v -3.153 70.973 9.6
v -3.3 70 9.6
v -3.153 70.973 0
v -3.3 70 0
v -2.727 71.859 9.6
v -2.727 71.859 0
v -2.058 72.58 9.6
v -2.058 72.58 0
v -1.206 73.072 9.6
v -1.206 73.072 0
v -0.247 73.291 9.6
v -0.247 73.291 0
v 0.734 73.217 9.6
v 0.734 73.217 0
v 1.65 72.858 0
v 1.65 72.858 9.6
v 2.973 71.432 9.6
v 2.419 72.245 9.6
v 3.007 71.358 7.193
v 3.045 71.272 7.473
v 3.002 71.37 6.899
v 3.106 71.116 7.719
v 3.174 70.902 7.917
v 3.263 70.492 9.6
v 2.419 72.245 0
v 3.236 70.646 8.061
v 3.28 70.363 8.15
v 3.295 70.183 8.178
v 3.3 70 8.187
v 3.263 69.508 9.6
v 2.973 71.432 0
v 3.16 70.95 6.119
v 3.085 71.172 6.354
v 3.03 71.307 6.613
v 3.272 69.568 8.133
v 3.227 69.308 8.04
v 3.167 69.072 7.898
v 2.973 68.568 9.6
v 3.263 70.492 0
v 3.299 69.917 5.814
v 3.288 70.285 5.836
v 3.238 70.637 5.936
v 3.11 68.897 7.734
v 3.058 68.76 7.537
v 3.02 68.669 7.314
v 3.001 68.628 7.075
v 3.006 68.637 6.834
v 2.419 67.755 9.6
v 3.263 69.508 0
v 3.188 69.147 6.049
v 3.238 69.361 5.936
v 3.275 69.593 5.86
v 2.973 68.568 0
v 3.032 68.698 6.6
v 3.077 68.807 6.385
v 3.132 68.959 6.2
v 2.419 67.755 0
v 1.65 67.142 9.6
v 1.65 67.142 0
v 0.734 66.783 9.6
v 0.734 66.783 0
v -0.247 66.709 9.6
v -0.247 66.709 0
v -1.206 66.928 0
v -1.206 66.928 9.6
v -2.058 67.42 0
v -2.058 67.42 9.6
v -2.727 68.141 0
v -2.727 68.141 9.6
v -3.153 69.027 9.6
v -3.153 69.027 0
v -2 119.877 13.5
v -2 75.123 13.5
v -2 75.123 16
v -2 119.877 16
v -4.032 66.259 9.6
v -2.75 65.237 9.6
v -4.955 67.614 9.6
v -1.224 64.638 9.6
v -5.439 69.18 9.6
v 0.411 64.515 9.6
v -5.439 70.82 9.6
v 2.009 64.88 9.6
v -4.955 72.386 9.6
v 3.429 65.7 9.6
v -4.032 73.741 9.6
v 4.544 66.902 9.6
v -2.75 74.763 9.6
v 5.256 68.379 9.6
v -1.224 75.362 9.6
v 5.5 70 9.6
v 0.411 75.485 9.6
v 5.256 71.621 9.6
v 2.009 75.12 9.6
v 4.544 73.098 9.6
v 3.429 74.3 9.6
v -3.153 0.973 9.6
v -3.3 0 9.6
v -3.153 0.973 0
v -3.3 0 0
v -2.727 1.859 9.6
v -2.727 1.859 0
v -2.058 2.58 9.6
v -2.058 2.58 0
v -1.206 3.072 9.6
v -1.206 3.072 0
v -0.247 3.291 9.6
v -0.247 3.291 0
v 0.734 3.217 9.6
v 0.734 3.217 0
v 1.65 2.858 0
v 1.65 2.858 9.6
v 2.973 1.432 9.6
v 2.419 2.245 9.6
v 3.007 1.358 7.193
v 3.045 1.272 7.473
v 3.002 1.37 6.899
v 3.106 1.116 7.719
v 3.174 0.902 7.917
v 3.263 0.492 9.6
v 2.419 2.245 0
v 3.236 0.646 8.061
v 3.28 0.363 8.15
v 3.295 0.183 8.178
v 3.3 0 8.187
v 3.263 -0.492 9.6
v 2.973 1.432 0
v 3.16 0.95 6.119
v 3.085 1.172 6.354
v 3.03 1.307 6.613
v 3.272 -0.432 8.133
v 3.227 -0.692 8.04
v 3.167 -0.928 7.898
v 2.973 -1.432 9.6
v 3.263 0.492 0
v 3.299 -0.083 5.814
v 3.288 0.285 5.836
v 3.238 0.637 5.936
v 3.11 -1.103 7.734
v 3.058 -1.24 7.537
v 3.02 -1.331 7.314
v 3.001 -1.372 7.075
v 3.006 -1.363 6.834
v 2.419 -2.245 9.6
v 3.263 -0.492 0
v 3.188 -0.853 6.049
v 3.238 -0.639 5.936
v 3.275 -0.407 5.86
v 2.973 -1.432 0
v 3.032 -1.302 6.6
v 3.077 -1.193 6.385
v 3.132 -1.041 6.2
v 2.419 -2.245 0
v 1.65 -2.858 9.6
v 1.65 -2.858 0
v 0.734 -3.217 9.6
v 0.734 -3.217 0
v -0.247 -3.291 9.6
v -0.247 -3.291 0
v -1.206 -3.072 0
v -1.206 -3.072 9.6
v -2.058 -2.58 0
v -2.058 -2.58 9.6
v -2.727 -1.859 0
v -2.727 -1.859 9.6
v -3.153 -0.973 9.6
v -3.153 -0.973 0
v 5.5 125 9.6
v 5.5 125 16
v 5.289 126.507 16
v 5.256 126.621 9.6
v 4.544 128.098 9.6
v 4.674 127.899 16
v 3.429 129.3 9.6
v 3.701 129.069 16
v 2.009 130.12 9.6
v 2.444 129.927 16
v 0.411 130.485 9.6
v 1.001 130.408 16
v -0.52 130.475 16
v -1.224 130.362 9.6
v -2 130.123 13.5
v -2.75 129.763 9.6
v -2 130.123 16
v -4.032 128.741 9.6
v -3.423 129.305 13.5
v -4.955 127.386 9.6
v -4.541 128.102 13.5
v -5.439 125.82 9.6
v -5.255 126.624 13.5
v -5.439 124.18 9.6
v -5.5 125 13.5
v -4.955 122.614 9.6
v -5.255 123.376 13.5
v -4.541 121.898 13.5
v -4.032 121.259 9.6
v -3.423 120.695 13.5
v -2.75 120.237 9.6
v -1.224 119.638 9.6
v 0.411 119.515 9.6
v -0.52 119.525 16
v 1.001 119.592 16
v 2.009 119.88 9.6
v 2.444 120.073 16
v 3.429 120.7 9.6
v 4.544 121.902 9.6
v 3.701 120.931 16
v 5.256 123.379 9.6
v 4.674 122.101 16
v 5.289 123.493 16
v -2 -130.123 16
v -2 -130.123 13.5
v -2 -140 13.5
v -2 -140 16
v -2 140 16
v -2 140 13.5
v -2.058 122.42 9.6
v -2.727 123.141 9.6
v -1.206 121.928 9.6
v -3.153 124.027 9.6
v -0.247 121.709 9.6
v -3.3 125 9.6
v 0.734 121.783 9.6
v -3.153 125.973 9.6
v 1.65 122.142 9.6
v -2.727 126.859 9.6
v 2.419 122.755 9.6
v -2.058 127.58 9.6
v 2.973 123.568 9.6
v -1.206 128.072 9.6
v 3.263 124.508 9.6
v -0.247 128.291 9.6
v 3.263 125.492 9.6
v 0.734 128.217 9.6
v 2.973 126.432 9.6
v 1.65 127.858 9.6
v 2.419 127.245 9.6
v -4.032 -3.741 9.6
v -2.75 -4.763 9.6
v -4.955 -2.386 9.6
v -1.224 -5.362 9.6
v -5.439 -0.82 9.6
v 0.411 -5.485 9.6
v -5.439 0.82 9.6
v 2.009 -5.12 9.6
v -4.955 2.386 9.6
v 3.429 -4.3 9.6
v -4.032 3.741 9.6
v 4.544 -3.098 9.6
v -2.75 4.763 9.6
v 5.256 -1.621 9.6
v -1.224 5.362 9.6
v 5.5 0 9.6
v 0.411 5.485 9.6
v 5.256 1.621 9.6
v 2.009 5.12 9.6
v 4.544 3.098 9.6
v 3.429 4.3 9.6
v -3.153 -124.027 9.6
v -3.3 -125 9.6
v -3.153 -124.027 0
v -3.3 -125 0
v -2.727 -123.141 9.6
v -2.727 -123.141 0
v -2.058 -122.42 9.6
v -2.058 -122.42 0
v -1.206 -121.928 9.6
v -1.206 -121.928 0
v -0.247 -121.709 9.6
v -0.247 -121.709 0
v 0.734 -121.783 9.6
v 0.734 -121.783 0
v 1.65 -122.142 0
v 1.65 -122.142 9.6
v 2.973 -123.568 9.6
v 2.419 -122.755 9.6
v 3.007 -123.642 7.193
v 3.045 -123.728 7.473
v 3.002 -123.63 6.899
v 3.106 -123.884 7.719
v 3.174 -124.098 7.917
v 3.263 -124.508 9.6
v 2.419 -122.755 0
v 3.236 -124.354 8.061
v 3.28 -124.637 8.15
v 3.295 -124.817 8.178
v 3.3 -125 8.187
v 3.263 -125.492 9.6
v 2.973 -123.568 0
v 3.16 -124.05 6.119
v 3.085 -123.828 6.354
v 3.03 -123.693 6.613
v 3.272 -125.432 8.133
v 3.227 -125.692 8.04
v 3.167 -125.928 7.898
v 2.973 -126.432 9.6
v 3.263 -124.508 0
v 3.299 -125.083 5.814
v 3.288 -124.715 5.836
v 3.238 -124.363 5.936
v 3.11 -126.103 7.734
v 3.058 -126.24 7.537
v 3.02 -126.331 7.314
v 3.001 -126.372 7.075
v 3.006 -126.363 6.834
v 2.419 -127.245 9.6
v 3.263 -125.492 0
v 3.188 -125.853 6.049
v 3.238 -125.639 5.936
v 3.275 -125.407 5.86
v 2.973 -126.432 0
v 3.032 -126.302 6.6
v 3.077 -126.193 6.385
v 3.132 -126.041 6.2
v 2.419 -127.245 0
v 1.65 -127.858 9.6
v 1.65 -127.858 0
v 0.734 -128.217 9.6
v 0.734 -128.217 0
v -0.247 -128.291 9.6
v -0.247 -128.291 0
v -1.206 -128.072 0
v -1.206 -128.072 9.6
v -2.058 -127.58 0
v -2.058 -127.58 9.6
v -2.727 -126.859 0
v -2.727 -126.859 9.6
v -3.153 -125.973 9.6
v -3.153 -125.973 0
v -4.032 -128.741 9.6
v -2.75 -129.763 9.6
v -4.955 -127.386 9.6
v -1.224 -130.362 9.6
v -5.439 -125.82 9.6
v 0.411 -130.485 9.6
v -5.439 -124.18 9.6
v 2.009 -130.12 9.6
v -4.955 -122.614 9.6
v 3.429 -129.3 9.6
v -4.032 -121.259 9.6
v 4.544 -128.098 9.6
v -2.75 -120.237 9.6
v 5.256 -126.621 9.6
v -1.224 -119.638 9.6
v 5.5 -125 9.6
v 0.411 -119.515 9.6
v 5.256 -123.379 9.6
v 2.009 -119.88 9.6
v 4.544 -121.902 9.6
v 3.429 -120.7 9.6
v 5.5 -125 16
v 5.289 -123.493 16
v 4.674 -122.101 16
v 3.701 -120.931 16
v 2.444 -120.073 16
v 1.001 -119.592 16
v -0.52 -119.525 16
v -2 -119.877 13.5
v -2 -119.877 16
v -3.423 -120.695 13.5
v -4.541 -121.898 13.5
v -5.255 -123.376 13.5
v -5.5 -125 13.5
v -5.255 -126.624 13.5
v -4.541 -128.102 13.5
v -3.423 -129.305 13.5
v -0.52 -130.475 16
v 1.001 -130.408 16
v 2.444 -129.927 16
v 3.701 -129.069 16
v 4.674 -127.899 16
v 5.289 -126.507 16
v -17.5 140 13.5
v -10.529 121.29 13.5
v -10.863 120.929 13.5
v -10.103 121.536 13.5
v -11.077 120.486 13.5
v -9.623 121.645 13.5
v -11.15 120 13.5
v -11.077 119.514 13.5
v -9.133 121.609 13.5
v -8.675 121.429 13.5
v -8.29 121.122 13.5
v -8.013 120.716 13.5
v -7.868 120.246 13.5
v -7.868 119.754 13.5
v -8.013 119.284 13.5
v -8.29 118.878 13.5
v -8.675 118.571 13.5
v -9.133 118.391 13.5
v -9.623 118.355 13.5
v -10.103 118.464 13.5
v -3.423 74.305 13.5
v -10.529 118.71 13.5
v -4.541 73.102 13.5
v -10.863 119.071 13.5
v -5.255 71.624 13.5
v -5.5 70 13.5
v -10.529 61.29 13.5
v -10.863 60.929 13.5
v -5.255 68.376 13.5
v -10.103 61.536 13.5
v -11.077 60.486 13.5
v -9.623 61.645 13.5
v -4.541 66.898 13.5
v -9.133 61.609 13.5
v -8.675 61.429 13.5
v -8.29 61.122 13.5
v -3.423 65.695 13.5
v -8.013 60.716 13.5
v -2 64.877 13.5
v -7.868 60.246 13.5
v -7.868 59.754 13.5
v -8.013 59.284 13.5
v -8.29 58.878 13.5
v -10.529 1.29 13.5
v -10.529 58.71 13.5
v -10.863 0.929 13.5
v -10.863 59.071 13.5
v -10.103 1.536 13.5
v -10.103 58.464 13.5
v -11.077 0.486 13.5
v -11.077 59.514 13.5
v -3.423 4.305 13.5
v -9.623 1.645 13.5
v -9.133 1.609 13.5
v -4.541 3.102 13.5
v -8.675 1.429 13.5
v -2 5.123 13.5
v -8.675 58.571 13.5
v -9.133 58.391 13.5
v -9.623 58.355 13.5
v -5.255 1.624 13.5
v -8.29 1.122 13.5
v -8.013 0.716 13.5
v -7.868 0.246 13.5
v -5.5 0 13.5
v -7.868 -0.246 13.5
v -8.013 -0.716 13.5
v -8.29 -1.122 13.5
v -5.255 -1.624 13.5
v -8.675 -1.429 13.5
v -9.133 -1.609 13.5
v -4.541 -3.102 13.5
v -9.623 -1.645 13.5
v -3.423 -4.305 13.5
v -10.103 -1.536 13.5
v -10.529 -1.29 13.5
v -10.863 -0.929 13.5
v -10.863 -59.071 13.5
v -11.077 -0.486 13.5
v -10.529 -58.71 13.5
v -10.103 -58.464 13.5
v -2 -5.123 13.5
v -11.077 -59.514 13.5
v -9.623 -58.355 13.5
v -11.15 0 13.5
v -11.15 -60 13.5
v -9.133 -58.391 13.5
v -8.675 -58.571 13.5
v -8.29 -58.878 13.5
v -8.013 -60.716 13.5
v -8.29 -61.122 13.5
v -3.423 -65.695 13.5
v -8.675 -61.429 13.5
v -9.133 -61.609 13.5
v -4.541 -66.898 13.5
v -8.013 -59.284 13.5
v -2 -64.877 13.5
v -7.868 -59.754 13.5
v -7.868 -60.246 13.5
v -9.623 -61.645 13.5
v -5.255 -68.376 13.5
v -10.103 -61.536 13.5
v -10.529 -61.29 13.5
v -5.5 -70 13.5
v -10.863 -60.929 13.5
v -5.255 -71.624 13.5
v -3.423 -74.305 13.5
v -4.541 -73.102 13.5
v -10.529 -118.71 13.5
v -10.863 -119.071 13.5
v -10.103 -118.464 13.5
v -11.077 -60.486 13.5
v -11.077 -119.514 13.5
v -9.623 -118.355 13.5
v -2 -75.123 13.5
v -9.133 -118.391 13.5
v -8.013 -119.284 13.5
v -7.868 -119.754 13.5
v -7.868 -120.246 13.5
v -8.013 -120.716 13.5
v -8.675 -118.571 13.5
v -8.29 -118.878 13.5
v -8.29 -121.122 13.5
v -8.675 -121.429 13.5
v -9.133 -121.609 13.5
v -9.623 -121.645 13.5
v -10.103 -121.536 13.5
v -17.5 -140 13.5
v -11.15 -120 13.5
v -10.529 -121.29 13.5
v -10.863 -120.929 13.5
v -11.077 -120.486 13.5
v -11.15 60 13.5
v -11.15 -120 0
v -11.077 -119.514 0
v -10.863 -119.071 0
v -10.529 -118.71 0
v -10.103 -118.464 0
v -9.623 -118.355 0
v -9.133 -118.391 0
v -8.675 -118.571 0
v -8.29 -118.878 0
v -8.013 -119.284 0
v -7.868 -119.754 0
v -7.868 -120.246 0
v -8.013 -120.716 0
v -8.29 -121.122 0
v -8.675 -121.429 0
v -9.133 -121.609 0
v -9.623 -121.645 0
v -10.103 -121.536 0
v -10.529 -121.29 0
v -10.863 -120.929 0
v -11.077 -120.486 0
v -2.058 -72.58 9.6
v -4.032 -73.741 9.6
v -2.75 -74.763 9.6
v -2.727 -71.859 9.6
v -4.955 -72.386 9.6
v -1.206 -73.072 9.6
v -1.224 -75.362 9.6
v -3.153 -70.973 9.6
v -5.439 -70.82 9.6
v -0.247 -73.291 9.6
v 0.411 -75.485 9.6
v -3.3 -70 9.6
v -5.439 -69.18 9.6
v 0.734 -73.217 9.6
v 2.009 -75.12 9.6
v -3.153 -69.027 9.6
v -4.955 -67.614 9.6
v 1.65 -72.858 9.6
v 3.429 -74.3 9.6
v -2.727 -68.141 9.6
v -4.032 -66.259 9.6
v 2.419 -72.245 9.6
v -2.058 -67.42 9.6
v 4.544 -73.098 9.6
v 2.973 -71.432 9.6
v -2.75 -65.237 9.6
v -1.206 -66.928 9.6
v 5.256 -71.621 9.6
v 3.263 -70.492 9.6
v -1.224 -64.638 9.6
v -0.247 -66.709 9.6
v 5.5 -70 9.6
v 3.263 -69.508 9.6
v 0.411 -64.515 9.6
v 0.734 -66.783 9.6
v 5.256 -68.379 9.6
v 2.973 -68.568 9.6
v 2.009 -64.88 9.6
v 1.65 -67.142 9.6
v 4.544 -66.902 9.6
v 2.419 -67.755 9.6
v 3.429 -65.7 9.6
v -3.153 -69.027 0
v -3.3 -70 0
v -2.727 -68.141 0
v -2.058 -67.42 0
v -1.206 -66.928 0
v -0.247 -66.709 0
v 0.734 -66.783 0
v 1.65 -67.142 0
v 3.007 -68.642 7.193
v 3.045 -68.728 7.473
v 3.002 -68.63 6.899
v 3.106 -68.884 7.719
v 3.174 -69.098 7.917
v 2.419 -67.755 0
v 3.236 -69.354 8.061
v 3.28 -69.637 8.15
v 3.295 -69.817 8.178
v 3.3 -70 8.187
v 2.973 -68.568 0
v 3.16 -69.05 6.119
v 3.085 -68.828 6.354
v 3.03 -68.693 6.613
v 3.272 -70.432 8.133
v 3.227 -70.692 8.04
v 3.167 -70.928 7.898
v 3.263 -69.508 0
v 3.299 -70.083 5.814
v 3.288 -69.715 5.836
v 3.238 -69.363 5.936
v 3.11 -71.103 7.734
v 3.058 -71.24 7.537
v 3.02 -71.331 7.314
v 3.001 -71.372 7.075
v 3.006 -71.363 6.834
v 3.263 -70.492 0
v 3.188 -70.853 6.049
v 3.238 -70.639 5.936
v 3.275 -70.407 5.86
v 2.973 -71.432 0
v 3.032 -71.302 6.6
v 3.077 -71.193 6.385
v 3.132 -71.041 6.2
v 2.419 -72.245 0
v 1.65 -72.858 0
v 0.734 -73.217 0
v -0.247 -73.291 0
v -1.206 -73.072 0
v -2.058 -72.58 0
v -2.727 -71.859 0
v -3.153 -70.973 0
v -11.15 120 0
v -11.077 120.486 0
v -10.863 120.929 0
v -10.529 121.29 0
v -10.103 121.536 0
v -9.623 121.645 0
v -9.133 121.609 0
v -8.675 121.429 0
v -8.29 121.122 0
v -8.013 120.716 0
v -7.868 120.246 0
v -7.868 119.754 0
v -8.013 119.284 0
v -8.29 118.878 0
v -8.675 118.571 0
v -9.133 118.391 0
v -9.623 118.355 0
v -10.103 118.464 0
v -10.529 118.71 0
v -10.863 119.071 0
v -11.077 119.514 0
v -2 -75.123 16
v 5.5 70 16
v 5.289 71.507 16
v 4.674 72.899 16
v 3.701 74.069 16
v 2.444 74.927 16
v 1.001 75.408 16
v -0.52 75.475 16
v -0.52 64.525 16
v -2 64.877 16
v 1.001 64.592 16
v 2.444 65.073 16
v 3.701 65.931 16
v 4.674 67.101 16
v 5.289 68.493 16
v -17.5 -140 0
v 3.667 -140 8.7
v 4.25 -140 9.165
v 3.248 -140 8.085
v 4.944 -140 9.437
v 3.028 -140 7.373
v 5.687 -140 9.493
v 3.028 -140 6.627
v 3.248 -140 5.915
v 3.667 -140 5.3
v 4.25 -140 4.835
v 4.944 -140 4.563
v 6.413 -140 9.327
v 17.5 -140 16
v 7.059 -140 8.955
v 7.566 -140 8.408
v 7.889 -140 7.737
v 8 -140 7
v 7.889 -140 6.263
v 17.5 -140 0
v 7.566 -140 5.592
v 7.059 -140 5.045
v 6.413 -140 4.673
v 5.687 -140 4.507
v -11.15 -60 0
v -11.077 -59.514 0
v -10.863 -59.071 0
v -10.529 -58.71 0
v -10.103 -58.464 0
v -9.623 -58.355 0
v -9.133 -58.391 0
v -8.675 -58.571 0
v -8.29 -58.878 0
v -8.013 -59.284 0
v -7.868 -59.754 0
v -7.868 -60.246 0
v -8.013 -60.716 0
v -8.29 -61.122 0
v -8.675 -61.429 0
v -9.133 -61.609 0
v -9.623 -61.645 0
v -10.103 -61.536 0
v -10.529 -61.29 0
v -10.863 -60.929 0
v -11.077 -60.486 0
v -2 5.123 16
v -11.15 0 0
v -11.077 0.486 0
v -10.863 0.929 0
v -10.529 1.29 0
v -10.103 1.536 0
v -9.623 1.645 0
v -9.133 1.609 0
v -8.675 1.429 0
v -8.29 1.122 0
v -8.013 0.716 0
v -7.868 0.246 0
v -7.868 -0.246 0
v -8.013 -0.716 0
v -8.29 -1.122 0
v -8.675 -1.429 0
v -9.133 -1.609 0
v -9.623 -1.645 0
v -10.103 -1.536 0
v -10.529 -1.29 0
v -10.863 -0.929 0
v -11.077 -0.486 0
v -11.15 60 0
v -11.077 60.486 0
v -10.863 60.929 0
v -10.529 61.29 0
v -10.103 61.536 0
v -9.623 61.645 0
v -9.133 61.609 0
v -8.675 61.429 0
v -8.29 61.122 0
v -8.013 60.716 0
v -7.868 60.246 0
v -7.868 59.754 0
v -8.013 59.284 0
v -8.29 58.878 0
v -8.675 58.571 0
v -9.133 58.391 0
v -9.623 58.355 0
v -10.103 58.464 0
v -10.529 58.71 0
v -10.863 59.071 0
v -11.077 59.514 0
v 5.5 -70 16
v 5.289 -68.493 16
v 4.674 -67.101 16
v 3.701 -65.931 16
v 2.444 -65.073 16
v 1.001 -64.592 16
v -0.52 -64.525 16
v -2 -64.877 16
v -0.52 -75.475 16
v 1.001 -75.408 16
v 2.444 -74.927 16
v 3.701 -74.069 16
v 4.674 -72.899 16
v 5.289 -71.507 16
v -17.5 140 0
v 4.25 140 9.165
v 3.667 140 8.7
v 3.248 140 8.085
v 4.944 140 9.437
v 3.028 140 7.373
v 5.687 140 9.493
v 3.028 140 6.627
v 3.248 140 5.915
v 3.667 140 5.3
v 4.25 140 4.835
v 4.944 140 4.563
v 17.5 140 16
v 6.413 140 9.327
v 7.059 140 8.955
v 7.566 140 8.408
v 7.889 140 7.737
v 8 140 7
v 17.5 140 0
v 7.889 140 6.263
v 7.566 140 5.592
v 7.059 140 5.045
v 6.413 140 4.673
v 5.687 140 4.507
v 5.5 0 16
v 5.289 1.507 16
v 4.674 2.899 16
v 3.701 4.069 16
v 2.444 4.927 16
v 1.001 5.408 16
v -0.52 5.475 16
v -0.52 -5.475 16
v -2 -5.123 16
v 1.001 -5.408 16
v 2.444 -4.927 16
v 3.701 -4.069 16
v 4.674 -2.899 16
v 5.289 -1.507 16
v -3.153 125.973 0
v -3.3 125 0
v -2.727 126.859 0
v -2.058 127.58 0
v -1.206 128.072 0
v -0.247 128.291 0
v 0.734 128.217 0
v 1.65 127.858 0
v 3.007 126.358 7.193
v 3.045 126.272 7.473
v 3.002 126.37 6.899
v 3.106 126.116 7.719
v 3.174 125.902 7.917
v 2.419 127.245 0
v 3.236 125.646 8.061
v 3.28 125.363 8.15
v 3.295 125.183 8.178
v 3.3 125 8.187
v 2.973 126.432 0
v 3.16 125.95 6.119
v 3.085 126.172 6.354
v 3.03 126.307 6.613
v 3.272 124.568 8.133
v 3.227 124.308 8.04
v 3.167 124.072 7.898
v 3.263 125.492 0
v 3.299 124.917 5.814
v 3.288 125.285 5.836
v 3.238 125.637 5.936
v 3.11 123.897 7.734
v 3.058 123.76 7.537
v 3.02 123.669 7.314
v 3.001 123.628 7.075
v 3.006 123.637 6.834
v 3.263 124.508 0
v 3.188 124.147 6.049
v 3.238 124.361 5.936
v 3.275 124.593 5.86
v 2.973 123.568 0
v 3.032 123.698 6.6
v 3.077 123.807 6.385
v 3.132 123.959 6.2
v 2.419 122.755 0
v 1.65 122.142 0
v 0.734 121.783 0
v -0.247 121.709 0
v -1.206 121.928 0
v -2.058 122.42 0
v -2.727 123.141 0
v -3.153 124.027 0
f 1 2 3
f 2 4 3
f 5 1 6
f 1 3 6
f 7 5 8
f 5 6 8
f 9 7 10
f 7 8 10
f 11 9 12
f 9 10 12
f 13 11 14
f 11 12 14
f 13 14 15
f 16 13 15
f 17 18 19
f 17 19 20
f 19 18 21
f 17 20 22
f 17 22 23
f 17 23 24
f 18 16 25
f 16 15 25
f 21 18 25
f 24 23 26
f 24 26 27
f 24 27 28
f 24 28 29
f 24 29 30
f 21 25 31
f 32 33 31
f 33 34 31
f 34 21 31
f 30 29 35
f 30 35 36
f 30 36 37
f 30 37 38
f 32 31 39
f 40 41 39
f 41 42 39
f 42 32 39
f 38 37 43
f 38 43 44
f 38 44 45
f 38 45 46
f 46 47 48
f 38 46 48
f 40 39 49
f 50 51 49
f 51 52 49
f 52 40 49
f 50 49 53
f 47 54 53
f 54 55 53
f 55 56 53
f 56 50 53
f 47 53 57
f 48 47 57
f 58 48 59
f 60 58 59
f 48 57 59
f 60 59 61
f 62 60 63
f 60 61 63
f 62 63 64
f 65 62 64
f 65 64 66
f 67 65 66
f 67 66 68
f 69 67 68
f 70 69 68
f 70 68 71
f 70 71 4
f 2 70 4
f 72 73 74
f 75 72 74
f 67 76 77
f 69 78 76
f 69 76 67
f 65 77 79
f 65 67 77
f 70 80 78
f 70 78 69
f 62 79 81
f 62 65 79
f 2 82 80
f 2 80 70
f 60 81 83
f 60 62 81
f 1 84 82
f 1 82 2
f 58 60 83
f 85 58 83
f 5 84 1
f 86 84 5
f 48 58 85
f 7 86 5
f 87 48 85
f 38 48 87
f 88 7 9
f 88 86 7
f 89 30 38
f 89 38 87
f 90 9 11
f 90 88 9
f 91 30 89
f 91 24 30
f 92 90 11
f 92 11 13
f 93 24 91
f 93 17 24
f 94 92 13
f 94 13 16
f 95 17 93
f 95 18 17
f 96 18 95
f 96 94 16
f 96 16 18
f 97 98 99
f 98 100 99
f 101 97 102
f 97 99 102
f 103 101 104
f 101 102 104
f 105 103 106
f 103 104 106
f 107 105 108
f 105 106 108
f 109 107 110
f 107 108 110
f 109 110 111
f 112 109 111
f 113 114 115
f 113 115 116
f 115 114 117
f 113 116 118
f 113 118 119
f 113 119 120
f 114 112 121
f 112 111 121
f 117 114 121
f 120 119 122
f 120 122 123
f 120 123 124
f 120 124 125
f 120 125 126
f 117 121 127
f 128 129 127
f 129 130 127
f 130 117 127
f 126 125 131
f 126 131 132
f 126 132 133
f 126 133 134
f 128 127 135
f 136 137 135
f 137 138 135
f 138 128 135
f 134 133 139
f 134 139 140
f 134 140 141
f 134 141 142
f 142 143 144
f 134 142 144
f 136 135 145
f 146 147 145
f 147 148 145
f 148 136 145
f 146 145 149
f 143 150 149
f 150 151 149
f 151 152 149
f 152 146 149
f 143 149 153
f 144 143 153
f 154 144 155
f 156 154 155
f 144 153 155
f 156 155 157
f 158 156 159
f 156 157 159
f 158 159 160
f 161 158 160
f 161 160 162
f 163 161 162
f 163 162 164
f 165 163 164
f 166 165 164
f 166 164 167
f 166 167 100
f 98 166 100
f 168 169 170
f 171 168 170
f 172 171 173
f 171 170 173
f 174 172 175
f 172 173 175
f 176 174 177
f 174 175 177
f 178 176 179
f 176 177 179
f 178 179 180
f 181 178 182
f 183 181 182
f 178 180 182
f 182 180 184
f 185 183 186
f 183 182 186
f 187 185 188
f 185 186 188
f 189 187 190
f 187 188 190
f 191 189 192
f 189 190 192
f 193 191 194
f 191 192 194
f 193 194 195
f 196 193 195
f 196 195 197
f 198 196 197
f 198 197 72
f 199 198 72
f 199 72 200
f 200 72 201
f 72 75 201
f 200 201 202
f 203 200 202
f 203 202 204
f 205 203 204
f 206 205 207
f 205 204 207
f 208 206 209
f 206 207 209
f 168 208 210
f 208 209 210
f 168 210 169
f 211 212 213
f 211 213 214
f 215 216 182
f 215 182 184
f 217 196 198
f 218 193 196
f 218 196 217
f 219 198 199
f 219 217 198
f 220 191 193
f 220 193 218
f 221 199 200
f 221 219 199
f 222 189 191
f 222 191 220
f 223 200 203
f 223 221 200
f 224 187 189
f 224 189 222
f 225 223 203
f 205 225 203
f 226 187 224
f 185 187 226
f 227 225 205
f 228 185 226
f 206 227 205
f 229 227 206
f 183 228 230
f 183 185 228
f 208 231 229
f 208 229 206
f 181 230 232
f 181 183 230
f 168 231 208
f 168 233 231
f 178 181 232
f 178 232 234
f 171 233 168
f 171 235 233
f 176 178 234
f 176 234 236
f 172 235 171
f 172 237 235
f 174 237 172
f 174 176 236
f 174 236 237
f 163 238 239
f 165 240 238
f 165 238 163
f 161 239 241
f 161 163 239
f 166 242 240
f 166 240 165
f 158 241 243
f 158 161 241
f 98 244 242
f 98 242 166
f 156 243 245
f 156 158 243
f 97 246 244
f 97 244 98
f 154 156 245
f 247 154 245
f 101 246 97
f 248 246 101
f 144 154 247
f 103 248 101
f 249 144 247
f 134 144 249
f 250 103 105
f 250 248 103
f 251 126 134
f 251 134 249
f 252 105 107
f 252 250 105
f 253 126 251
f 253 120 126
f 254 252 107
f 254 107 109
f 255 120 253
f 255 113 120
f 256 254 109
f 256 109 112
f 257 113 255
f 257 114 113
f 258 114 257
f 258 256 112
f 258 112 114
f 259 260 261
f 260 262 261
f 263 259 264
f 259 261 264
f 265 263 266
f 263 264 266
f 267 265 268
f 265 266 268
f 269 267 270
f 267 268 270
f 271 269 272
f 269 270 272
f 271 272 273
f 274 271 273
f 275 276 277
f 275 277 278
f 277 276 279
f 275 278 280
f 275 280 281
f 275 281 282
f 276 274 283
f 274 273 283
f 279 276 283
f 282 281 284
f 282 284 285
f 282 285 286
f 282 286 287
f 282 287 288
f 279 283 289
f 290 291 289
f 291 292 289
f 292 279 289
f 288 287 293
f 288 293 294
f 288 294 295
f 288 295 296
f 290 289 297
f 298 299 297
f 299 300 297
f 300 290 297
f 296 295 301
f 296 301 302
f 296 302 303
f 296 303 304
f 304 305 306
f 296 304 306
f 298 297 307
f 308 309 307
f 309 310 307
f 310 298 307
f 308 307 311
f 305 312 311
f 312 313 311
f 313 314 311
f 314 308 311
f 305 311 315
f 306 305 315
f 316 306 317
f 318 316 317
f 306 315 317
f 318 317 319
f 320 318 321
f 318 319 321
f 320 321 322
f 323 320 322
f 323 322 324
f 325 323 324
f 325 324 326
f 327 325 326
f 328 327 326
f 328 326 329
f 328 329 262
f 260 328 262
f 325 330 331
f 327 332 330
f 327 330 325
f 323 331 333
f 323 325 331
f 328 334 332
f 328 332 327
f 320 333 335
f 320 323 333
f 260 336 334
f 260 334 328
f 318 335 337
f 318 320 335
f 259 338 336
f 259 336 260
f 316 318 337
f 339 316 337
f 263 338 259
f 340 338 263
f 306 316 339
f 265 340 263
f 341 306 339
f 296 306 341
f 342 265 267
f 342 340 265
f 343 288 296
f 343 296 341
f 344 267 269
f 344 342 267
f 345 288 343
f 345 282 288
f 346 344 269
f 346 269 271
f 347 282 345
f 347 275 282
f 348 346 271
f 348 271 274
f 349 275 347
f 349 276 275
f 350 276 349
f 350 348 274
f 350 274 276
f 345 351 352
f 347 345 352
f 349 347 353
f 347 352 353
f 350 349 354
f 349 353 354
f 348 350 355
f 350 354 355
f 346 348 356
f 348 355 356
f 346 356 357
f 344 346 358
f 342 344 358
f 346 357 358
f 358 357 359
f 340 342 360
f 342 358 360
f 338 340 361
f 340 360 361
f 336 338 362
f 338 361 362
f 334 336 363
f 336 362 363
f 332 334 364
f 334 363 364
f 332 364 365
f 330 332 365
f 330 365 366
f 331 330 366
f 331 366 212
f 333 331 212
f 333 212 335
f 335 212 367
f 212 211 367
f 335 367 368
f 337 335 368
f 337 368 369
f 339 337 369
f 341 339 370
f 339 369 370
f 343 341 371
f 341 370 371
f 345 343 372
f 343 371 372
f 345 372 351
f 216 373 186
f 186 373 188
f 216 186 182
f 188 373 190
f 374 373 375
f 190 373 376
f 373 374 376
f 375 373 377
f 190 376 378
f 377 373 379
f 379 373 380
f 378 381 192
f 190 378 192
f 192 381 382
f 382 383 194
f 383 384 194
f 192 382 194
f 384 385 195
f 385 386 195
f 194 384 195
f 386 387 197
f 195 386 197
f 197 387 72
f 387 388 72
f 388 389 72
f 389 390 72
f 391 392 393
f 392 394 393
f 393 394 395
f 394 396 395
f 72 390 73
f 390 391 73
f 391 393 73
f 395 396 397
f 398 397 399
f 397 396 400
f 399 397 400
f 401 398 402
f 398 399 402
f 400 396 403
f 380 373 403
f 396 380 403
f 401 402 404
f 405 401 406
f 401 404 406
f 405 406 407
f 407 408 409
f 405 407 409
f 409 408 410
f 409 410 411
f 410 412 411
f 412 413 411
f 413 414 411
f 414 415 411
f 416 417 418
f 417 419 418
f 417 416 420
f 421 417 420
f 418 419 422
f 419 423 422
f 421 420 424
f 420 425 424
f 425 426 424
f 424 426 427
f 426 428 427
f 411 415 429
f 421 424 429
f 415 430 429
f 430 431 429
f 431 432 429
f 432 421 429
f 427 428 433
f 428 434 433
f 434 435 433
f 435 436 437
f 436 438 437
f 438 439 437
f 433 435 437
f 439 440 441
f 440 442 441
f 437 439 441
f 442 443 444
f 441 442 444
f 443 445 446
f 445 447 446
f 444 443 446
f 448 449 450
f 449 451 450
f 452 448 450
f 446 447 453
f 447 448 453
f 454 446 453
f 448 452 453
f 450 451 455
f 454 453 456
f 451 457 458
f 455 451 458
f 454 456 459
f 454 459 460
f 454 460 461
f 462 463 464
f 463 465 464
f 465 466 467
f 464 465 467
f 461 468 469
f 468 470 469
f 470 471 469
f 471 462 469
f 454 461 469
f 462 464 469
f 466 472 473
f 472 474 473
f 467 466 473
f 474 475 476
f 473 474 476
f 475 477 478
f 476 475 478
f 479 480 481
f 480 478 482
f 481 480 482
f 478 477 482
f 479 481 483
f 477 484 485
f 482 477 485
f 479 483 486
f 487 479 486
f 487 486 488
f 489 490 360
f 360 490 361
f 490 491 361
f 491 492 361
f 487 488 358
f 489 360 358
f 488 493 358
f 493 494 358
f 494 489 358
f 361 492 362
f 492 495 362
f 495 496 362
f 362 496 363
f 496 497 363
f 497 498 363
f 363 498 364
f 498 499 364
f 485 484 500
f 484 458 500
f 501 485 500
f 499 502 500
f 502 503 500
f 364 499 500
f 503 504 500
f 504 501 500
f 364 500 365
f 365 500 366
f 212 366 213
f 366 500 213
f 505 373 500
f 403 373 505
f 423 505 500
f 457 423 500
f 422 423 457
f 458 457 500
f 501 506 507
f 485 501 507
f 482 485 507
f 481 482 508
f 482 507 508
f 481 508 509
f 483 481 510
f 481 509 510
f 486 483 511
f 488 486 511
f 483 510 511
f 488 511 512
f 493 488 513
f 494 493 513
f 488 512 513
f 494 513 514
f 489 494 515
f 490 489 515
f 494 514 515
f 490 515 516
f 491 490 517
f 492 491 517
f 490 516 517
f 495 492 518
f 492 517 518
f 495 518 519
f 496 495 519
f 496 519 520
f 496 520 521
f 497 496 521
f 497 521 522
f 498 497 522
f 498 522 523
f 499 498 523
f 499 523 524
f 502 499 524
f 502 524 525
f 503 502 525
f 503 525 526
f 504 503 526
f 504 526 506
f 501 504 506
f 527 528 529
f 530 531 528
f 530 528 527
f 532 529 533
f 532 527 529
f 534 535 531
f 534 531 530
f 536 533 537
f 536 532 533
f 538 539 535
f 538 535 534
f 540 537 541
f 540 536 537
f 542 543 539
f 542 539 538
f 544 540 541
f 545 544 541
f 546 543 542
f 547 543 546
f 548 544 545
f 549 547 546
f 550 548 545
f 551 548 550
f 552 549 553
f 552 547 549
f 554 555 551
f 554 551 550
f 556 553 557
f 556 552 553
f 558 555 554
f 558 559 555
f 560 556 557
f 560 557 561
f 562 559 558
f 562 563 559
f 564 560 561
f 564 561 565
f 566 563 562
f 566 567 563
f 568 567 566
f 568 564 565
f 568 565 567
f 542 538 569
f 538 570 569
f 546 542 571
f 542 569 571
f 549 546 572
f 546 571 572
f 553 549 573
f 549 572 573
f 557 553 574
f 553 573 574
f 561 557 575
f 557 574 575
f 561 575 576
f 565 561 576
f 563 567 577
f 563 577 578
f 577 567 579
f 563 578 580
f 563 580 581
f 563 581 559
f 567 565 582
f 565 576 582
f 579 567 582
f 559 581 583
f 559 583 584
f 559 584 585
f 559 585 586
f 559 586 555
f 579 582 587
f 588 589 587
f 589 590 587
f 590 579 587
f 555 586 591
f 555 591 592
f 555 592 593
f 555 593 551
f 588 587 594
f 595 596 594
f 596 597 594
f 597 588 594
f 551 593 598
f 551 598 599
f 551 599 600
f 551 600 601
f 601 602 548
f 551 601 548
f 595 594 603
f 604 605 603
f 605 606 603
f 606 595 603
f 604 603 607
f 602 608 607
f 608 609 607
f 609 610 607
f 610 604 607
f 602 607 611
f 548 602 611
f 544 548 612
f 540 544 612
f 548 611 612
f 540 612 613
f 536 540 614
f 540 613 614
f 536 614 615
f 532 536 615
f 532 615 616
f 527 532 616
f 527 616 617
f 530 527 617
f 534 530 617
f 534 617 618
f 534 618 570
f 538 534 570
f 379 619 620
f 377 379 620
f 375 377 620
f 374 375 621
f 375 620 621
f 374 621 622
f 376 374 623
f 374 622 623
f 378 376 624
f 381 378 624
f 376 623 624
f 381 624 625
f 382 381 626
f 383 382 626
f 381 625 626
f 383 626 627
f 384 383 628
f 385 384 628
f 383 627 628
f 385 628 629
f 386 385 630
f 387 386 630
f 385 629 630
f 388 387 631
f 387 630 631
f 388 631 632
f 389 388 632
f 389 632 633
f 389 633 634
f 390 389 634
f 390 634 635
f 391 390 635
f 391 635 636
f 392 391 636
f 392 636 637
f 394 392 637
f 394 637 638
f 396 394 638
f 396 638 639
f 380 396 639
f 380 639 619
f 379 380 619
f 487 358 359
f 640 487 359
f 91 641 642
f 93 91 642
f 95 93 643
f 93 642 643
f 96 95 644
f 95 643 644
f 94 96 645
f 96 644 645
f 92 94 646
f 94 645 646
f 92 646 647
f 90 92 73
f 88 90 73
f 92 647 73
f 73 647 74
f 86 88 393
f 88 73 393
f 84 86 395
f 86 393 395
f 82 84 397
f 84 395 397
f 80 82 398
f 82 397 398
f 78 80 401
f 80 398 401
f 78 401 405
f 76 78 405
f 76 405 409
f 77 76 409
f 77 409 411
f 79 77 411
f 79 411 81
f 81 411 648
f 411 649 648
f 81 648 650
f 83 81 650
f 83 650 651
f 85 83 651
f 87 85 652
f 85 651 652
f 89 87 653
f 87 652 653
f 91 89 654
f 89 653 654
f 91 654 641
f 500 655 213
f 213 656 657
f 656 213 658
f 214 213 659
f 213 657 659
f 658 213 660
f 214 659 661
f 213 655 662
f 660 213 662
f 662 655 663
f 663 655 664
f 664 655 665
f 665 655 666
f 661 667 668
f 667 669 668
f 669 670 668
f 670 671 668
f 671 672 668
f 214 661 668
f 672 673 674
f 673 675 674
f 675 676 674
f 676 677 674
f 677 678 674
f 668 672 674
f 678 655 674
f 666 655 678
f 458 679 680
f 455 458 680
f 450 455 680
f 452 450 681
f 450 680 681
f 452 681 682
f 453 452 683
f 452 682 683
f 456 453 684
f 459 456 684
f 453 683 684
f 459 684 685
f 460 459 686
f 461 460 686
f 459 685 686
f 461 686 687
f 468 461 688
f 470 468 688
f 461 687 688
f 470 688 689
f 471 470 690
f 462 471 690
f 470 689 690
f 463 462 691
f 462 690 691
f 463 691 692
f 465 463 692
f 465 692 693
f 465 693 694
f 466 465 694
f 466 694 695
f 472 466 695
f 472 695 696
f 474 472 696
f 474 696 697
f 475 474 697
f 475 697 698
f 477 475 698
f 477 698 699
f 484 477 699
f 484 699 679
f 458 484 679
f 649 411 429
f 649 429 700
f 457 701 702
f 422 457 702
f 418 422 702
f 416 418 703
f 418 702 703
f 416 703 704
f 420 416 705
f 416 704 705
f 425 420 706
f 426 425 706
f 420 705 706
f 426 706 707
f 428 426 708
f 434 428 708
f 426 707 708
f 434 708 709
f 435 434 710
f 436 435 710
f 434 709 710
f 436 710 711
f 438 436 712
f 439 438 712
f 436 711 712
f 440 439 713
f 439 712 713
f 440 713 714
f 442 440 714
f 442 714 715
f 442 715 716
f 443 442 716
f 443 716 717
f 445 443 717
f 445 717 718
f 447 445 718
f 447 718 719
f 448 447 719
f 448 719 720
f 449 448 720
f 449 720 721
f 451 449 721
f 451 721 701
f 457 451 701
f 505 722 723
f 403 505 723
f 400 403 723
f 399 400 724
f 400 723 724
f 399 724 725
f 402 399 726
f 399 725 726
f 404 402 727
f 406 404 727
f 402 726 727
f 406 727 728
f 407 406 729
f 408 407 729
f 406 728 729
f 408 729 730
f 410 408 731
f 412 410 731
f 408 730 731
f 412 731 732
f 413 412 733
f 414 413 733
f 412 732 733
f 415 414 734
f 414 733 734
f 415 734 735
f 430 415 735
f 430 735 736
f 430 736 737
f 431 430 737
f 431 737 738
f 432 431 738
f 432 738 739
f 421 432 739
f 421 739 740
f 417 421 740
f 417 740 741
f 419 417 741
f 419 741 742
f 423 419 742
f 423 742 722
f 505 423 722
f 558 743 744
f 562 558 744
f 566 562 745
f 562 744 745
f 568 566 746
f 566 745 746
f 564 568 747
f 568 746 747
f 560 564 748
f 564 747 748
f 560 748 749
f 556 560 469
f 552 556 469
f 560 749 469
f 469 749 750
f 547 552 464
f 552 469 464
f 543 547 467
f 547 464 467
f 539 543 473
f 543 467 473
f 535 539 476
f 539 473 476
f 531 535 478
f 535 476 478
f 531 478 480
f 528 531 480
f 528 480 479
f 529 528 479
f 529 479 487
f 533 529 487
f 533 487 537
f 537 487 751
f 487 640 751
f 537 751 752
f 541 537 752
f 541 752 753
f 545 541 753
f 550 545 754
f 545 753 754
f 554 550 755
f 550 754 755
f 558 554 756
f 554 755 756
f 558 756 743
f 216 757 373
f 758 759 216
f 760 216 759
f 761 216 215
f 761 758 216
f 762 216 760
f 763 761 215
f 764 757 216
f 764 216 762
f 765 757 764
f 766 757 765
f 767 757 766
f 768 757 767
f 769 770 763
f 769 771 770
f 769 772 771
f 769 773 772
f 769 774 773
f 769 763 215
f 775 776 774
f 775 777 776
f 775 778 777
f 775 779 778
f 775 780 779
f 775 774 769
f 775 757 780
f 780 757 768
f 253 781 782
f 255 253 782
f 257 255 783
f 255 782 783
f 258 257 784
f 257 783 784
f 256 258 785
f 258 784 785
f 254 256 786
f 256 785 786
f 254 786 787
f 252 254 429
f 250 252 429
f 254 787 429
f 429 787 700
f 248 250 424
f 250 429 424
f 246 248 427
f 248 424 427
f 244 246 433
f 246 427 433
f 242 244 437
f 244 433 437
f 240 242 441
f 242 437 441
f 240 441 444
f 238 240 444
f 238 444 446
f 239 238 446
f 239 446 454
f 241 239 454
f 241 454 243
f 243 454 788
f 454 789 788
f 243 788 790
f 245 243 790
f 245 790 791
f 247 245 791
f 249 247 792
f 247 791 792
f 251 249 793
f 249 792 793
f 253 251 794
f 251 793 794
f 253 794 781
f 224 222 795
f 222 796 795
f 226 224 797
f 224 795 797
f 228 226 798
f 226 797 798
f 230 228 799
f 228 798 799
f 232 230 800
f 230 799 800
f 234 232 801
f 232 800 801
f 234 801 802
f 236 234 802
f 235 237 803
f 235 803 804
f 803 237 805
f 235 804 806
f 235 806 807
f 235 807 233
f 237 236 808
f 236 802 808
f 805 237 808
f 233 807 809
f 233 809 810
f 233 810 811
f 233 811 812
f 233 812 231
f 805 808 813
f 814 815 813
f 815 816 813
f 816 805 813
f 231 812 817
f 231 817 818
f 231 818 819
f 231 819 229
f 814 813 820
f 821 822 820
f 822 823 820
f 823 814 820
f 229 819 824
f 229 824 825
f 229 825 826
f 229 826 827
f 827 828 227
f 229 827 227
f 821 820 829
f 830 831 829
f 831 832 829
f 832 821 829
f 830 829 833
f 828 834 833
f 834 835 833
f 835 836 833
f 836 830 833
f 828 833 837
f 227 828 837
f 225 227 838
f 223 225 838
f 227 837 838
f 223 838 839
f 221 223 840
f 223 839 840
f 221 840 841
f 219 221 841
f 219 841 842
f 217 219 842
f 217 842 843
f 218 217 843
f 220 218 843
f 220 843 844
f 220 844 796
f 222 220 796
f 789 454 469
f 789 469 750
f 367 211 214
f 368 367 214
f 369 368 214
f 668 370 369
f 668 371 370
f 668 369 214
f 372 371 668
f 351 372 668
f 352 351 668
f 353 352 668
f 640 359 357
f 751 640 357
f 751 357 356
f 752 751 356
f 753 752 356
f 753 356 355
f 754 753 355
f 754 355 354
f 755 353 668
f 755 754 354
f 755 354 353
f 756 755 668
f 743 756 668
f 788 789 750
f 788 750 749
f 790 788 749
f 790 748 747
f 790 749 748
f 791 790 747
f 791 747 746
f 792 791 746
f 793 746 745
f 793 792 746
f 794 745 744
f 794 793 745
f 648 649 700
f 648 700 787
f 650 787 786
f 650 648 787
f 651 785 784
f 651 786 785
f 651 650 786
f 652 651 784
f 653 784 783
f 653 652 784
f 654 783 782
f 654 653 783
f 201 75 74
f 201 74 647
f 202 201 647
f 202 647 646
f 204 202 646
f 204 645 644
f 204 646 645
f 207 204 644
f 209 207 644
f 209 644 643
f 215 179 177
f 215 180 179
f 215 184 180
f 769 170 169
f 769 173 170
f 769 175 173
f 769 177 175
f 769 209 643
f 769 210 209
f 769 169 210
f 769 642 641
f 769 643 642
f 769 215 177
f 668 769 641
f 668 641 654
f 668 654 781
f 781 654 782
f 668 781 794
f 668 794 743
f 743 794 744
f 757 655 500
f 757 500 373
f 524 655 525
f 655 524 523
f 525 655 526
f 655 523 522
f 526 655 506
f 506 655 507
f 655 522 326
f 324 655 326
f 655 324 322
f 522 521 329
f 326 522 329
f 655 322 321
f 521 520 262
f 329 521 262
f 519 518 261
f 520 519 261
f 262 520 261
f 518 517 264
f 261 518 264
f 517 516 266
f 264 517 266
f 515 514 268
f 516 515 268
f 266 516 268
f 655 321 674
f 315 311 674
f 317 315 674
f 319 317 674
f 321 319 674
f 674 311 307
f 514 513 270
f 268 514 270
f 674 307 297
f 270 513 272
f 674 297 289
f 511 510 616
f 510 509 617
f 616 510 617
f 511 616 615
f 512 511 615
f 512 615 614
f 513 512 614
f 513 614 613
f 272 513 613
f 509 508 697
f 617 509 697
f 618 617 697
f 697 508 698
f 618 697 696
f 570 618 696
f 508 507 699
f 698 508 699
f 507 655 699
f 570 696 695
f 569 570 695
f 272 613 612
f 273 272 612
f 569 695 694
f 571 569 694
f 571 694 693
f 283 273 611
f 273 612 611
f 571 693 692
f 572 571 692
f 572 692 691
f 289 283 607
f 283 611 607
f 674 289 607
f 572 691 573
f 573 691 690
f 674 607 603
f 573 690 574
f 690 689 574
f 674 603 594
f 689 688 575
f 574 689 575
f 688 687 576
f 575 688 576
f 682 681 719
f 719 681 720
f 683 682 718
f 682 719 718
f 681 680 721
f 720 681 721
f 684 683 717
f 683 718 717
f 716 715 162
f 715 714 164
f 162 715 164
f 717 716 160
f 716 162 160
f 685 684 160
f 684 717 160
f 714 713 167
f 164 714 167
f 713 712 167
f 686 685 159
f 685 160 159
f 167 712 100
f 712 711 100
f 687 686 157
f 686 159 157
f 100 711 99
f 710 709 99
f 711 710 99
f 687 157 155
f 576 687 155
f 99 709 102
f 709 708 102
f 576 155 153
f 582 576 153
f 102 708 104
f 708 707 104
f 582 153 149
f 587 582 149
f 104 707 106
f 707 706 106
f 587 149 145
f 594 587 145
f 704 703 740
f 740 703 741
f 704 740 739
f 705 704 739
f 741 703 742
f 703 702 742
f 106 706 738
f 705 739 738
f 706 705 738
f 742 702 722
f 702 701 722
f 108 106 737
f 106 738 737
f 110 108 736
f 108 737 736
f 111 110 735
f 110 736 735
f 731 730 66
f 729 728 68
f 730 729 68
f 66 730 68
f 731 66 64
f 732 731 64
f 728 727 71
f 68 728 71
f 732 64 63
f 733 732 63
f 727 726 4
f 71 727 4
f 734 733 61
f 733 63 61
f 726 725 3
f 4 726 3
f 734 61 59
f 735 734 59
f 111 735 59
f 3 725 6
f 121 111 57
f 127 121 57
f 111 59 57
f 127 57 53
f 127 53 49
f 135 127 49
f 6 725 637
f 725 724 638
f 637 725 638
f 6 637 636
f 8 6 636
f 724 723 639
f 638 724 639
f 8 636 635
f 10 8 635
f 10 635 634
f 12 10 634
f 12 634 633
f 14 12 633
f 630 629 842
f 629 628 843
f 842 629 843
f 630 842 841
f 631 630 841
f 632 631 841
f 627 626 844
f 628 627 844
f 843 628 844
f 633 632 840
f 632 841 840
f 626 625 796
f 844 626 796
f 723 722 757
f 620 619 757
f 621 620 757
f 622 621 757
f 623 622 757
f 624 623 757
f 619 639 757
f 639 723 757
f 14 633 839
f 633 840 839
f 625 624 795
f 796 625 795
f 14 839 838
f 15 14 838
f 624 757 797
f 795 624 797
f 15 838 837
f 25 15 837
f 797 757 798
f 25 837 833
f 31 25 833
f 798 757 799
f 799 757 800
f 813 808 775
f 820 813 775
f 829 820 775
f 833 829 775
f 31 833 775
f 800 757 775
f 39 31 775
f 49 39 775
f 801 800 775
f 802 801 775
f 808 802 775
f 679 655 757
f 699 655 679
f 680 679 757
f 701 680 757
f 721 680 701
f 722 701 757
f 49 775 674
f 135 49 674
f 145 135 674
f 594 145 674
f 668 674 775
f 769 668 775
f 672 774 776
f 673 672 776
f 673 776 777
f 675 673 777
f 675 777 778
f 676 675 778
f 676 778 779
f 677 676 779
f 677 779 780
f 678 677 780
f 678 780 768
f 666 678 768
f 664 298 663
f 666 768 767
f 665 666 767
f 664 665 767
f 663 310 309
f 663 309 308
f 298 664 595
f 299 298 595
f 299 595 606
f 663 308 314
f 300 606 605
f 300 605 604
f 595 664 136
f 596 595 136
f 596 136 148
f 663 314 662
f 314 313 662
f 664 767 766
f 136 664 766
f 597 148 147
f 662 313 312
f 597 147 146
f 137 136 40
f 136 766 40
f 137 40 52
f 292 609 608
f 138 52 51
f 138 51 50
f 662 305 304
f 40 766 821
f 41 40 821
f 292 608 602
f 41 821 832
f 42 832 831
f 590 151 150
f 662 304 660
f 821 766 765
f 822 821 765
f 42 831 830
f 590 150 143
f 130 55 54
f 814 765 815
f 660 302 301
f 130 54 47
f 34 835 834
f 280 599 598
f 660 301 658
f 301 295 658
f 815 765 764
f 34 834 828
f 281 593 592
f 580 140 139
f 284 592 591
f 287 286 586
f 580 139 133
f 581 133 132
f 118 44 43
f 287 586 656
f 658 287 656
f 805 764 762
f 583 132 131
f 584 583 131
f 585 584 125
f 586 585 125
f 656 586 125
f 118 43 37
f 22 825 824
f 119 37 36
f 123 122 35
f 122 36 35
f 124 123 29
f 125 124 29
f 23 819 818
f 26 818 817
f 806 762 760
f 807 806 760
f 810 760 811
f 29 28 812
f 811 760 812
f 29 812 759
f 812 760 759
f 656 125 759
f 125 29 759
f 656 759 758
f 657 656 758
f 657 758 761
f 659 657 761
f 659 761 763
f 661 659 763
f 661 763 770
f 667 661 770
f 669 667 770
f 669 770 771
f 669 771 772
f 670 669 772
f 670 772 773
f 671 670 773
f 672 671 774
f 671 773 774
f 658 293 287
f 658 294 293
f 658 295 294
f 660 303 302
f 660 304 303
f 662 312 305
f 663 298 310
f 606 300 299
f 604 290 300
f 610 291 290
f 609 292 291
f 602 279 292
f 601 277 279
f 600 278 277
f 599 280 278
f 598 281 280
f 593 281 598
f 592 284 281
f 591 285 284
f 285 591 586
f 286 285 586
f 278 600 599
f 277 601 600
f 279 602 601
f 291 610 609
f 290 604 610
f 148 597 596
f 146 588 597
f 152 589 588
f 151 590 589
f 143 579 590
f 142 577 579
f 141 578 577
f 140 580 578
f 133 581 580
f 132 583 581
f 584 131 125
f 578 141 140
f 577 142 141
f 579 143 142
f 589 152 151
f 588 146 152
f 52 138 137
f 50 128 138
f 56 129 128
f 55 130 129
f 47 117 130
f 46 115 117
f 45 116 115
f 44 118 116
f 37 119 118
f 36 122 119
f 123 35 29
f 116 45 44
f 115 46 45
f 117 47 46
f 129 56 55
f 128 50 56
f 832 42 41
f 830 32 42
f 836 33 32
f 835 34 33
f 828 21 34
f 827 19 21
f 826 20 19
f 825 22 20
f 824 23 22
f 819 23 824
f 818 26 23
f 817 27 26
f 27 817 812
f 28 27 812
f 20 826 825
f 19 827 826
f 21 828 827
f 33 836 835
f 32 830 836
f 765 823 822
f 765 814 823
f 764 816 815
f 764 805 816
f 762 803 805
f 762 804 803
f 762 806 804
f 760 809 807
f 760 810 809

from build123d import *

# Parameters (mm, degrees)
SKETCH1_W                                           = 35
SKETCH1_H                                           = 280
EXTRUDE1_DEPTH                                      = 16
EXTRUDE2_REACH                                      = 282
SKETCH2_W                                           = 15.5
SKETCH2_H                                           = 2.5
M4_TAPPED_HOLE1_D                                   = 3.3
M6_TAPPED_HOLE1_D                                   = 5
CBORE_FOR_M6_HEX_SOCKET_HEAD_CAP_SCREW1_D           = 6.6
CBORE_FOR_M6_HEX_SOCKET_HEAD_CAP_SCREW1_DEPTH       = 29
CBORE_FOR_M6_HEX_SOCKET_HEAD_CAP_SCREW1_CBORE_D     = 11
CBORE_FOR_M6_HEX_SOCKET_HEAD_CAP_SCREW1_CBORE_DEPTH = 6.4
CBORE_FOR_M6_HEX_SOCKET_HEAD_CAP_SCREW1_TIP         = 1.982840043


with BuildPart() as part:
    # Sketch1 → Extrude1 (new body)
    with BuildSketch(Plane.XY):
        Rectangle(SKETCH1_W, SKETCH1_H)
    extrude(amount=EXTRUDE1_DEPTH)

    # Sketch2 → Extrude2 (cut, up to next)
    with BuildSketch(Plane.XZ.offset(140), mode=Mode.PRIVATE) as extrude2_sk1:
        with Locations((-9.75, 14.75)):
            Rectangle(SKETCH2_W, SKETCH2_H)
    extrude2_tool1 = extrude(extrude2_sk1.sketch, amount=-EXTRUDE2_REACH, mode=Mode.PRIVATE) & part.part
    add(extrude2_tool1.solids().sort_by_distance((-9.75, -140, 14.75))[0], mode=Mode.SUBTRACT)

    # M4 Tapped Hole1 (through all)
    with Locations(Plane.XY.offset(13.5)):
        with Locations((-9.5, -120), (-9.5, -60), (-9.5, 0), (-9.5, 60), (-9.5, 120)):
            Hole(M4_TAPPED_HOLE1_D / 2)

    # M6 Tapped Hole1 (through all)
    with Locations(Plane(origin=(0, -140, 0), x_dir=(-1, 0, 0), z_dir=(0, -1, 0))):
        with Locations((-5.5, -7)):
            Hole(M6_TAPPED_HOLE1_D / 2)

    # CBORE for M6 Hex Socket Head Cap Screw1
    with Locations(Plane.XY.offset(16)):
        with Locations((0, 125), (0, 70), (0, 0), (0, -70), (0, -125)):
            CounterBoreHole(CBORE_FOR_M6_HEX_SOCKET_HEAD_CAP_SCREW1_D / 2, CBORE_FOR_M6_HEX_SOCKET_HEAD_CAP_SCREW1_CBORE_D / 2, CBORE_FOR_M6_HEX_SOCKET_HEAD_CAP_SCREW1_CBORE_DEPTH, depth=CBORE_FOR_M6_HEX_SOCKET_HEAD_CAP_SCREW1_DEPTH)
            with Locations((0, 0, -(CBORE_FOR_M6_HEX_SOCKET_HEAD_CAP_SCREW1_DEPTH + CBORE_FOR_M6_HEX_SOCKET_HEAD_CAP_SCREW1_TIP / 2))):  # 118° drill point
                Cone(0, CBORE_FOR_M6_HEX_SOCKET_HEAD_CAP_SCREW1_D / 2, CBORE_FOR_M6_HEX_SOCKET_HEAD_CAP_SCREW1_TIP, mode=Mode.SUBTRACT)


solid = part.part
